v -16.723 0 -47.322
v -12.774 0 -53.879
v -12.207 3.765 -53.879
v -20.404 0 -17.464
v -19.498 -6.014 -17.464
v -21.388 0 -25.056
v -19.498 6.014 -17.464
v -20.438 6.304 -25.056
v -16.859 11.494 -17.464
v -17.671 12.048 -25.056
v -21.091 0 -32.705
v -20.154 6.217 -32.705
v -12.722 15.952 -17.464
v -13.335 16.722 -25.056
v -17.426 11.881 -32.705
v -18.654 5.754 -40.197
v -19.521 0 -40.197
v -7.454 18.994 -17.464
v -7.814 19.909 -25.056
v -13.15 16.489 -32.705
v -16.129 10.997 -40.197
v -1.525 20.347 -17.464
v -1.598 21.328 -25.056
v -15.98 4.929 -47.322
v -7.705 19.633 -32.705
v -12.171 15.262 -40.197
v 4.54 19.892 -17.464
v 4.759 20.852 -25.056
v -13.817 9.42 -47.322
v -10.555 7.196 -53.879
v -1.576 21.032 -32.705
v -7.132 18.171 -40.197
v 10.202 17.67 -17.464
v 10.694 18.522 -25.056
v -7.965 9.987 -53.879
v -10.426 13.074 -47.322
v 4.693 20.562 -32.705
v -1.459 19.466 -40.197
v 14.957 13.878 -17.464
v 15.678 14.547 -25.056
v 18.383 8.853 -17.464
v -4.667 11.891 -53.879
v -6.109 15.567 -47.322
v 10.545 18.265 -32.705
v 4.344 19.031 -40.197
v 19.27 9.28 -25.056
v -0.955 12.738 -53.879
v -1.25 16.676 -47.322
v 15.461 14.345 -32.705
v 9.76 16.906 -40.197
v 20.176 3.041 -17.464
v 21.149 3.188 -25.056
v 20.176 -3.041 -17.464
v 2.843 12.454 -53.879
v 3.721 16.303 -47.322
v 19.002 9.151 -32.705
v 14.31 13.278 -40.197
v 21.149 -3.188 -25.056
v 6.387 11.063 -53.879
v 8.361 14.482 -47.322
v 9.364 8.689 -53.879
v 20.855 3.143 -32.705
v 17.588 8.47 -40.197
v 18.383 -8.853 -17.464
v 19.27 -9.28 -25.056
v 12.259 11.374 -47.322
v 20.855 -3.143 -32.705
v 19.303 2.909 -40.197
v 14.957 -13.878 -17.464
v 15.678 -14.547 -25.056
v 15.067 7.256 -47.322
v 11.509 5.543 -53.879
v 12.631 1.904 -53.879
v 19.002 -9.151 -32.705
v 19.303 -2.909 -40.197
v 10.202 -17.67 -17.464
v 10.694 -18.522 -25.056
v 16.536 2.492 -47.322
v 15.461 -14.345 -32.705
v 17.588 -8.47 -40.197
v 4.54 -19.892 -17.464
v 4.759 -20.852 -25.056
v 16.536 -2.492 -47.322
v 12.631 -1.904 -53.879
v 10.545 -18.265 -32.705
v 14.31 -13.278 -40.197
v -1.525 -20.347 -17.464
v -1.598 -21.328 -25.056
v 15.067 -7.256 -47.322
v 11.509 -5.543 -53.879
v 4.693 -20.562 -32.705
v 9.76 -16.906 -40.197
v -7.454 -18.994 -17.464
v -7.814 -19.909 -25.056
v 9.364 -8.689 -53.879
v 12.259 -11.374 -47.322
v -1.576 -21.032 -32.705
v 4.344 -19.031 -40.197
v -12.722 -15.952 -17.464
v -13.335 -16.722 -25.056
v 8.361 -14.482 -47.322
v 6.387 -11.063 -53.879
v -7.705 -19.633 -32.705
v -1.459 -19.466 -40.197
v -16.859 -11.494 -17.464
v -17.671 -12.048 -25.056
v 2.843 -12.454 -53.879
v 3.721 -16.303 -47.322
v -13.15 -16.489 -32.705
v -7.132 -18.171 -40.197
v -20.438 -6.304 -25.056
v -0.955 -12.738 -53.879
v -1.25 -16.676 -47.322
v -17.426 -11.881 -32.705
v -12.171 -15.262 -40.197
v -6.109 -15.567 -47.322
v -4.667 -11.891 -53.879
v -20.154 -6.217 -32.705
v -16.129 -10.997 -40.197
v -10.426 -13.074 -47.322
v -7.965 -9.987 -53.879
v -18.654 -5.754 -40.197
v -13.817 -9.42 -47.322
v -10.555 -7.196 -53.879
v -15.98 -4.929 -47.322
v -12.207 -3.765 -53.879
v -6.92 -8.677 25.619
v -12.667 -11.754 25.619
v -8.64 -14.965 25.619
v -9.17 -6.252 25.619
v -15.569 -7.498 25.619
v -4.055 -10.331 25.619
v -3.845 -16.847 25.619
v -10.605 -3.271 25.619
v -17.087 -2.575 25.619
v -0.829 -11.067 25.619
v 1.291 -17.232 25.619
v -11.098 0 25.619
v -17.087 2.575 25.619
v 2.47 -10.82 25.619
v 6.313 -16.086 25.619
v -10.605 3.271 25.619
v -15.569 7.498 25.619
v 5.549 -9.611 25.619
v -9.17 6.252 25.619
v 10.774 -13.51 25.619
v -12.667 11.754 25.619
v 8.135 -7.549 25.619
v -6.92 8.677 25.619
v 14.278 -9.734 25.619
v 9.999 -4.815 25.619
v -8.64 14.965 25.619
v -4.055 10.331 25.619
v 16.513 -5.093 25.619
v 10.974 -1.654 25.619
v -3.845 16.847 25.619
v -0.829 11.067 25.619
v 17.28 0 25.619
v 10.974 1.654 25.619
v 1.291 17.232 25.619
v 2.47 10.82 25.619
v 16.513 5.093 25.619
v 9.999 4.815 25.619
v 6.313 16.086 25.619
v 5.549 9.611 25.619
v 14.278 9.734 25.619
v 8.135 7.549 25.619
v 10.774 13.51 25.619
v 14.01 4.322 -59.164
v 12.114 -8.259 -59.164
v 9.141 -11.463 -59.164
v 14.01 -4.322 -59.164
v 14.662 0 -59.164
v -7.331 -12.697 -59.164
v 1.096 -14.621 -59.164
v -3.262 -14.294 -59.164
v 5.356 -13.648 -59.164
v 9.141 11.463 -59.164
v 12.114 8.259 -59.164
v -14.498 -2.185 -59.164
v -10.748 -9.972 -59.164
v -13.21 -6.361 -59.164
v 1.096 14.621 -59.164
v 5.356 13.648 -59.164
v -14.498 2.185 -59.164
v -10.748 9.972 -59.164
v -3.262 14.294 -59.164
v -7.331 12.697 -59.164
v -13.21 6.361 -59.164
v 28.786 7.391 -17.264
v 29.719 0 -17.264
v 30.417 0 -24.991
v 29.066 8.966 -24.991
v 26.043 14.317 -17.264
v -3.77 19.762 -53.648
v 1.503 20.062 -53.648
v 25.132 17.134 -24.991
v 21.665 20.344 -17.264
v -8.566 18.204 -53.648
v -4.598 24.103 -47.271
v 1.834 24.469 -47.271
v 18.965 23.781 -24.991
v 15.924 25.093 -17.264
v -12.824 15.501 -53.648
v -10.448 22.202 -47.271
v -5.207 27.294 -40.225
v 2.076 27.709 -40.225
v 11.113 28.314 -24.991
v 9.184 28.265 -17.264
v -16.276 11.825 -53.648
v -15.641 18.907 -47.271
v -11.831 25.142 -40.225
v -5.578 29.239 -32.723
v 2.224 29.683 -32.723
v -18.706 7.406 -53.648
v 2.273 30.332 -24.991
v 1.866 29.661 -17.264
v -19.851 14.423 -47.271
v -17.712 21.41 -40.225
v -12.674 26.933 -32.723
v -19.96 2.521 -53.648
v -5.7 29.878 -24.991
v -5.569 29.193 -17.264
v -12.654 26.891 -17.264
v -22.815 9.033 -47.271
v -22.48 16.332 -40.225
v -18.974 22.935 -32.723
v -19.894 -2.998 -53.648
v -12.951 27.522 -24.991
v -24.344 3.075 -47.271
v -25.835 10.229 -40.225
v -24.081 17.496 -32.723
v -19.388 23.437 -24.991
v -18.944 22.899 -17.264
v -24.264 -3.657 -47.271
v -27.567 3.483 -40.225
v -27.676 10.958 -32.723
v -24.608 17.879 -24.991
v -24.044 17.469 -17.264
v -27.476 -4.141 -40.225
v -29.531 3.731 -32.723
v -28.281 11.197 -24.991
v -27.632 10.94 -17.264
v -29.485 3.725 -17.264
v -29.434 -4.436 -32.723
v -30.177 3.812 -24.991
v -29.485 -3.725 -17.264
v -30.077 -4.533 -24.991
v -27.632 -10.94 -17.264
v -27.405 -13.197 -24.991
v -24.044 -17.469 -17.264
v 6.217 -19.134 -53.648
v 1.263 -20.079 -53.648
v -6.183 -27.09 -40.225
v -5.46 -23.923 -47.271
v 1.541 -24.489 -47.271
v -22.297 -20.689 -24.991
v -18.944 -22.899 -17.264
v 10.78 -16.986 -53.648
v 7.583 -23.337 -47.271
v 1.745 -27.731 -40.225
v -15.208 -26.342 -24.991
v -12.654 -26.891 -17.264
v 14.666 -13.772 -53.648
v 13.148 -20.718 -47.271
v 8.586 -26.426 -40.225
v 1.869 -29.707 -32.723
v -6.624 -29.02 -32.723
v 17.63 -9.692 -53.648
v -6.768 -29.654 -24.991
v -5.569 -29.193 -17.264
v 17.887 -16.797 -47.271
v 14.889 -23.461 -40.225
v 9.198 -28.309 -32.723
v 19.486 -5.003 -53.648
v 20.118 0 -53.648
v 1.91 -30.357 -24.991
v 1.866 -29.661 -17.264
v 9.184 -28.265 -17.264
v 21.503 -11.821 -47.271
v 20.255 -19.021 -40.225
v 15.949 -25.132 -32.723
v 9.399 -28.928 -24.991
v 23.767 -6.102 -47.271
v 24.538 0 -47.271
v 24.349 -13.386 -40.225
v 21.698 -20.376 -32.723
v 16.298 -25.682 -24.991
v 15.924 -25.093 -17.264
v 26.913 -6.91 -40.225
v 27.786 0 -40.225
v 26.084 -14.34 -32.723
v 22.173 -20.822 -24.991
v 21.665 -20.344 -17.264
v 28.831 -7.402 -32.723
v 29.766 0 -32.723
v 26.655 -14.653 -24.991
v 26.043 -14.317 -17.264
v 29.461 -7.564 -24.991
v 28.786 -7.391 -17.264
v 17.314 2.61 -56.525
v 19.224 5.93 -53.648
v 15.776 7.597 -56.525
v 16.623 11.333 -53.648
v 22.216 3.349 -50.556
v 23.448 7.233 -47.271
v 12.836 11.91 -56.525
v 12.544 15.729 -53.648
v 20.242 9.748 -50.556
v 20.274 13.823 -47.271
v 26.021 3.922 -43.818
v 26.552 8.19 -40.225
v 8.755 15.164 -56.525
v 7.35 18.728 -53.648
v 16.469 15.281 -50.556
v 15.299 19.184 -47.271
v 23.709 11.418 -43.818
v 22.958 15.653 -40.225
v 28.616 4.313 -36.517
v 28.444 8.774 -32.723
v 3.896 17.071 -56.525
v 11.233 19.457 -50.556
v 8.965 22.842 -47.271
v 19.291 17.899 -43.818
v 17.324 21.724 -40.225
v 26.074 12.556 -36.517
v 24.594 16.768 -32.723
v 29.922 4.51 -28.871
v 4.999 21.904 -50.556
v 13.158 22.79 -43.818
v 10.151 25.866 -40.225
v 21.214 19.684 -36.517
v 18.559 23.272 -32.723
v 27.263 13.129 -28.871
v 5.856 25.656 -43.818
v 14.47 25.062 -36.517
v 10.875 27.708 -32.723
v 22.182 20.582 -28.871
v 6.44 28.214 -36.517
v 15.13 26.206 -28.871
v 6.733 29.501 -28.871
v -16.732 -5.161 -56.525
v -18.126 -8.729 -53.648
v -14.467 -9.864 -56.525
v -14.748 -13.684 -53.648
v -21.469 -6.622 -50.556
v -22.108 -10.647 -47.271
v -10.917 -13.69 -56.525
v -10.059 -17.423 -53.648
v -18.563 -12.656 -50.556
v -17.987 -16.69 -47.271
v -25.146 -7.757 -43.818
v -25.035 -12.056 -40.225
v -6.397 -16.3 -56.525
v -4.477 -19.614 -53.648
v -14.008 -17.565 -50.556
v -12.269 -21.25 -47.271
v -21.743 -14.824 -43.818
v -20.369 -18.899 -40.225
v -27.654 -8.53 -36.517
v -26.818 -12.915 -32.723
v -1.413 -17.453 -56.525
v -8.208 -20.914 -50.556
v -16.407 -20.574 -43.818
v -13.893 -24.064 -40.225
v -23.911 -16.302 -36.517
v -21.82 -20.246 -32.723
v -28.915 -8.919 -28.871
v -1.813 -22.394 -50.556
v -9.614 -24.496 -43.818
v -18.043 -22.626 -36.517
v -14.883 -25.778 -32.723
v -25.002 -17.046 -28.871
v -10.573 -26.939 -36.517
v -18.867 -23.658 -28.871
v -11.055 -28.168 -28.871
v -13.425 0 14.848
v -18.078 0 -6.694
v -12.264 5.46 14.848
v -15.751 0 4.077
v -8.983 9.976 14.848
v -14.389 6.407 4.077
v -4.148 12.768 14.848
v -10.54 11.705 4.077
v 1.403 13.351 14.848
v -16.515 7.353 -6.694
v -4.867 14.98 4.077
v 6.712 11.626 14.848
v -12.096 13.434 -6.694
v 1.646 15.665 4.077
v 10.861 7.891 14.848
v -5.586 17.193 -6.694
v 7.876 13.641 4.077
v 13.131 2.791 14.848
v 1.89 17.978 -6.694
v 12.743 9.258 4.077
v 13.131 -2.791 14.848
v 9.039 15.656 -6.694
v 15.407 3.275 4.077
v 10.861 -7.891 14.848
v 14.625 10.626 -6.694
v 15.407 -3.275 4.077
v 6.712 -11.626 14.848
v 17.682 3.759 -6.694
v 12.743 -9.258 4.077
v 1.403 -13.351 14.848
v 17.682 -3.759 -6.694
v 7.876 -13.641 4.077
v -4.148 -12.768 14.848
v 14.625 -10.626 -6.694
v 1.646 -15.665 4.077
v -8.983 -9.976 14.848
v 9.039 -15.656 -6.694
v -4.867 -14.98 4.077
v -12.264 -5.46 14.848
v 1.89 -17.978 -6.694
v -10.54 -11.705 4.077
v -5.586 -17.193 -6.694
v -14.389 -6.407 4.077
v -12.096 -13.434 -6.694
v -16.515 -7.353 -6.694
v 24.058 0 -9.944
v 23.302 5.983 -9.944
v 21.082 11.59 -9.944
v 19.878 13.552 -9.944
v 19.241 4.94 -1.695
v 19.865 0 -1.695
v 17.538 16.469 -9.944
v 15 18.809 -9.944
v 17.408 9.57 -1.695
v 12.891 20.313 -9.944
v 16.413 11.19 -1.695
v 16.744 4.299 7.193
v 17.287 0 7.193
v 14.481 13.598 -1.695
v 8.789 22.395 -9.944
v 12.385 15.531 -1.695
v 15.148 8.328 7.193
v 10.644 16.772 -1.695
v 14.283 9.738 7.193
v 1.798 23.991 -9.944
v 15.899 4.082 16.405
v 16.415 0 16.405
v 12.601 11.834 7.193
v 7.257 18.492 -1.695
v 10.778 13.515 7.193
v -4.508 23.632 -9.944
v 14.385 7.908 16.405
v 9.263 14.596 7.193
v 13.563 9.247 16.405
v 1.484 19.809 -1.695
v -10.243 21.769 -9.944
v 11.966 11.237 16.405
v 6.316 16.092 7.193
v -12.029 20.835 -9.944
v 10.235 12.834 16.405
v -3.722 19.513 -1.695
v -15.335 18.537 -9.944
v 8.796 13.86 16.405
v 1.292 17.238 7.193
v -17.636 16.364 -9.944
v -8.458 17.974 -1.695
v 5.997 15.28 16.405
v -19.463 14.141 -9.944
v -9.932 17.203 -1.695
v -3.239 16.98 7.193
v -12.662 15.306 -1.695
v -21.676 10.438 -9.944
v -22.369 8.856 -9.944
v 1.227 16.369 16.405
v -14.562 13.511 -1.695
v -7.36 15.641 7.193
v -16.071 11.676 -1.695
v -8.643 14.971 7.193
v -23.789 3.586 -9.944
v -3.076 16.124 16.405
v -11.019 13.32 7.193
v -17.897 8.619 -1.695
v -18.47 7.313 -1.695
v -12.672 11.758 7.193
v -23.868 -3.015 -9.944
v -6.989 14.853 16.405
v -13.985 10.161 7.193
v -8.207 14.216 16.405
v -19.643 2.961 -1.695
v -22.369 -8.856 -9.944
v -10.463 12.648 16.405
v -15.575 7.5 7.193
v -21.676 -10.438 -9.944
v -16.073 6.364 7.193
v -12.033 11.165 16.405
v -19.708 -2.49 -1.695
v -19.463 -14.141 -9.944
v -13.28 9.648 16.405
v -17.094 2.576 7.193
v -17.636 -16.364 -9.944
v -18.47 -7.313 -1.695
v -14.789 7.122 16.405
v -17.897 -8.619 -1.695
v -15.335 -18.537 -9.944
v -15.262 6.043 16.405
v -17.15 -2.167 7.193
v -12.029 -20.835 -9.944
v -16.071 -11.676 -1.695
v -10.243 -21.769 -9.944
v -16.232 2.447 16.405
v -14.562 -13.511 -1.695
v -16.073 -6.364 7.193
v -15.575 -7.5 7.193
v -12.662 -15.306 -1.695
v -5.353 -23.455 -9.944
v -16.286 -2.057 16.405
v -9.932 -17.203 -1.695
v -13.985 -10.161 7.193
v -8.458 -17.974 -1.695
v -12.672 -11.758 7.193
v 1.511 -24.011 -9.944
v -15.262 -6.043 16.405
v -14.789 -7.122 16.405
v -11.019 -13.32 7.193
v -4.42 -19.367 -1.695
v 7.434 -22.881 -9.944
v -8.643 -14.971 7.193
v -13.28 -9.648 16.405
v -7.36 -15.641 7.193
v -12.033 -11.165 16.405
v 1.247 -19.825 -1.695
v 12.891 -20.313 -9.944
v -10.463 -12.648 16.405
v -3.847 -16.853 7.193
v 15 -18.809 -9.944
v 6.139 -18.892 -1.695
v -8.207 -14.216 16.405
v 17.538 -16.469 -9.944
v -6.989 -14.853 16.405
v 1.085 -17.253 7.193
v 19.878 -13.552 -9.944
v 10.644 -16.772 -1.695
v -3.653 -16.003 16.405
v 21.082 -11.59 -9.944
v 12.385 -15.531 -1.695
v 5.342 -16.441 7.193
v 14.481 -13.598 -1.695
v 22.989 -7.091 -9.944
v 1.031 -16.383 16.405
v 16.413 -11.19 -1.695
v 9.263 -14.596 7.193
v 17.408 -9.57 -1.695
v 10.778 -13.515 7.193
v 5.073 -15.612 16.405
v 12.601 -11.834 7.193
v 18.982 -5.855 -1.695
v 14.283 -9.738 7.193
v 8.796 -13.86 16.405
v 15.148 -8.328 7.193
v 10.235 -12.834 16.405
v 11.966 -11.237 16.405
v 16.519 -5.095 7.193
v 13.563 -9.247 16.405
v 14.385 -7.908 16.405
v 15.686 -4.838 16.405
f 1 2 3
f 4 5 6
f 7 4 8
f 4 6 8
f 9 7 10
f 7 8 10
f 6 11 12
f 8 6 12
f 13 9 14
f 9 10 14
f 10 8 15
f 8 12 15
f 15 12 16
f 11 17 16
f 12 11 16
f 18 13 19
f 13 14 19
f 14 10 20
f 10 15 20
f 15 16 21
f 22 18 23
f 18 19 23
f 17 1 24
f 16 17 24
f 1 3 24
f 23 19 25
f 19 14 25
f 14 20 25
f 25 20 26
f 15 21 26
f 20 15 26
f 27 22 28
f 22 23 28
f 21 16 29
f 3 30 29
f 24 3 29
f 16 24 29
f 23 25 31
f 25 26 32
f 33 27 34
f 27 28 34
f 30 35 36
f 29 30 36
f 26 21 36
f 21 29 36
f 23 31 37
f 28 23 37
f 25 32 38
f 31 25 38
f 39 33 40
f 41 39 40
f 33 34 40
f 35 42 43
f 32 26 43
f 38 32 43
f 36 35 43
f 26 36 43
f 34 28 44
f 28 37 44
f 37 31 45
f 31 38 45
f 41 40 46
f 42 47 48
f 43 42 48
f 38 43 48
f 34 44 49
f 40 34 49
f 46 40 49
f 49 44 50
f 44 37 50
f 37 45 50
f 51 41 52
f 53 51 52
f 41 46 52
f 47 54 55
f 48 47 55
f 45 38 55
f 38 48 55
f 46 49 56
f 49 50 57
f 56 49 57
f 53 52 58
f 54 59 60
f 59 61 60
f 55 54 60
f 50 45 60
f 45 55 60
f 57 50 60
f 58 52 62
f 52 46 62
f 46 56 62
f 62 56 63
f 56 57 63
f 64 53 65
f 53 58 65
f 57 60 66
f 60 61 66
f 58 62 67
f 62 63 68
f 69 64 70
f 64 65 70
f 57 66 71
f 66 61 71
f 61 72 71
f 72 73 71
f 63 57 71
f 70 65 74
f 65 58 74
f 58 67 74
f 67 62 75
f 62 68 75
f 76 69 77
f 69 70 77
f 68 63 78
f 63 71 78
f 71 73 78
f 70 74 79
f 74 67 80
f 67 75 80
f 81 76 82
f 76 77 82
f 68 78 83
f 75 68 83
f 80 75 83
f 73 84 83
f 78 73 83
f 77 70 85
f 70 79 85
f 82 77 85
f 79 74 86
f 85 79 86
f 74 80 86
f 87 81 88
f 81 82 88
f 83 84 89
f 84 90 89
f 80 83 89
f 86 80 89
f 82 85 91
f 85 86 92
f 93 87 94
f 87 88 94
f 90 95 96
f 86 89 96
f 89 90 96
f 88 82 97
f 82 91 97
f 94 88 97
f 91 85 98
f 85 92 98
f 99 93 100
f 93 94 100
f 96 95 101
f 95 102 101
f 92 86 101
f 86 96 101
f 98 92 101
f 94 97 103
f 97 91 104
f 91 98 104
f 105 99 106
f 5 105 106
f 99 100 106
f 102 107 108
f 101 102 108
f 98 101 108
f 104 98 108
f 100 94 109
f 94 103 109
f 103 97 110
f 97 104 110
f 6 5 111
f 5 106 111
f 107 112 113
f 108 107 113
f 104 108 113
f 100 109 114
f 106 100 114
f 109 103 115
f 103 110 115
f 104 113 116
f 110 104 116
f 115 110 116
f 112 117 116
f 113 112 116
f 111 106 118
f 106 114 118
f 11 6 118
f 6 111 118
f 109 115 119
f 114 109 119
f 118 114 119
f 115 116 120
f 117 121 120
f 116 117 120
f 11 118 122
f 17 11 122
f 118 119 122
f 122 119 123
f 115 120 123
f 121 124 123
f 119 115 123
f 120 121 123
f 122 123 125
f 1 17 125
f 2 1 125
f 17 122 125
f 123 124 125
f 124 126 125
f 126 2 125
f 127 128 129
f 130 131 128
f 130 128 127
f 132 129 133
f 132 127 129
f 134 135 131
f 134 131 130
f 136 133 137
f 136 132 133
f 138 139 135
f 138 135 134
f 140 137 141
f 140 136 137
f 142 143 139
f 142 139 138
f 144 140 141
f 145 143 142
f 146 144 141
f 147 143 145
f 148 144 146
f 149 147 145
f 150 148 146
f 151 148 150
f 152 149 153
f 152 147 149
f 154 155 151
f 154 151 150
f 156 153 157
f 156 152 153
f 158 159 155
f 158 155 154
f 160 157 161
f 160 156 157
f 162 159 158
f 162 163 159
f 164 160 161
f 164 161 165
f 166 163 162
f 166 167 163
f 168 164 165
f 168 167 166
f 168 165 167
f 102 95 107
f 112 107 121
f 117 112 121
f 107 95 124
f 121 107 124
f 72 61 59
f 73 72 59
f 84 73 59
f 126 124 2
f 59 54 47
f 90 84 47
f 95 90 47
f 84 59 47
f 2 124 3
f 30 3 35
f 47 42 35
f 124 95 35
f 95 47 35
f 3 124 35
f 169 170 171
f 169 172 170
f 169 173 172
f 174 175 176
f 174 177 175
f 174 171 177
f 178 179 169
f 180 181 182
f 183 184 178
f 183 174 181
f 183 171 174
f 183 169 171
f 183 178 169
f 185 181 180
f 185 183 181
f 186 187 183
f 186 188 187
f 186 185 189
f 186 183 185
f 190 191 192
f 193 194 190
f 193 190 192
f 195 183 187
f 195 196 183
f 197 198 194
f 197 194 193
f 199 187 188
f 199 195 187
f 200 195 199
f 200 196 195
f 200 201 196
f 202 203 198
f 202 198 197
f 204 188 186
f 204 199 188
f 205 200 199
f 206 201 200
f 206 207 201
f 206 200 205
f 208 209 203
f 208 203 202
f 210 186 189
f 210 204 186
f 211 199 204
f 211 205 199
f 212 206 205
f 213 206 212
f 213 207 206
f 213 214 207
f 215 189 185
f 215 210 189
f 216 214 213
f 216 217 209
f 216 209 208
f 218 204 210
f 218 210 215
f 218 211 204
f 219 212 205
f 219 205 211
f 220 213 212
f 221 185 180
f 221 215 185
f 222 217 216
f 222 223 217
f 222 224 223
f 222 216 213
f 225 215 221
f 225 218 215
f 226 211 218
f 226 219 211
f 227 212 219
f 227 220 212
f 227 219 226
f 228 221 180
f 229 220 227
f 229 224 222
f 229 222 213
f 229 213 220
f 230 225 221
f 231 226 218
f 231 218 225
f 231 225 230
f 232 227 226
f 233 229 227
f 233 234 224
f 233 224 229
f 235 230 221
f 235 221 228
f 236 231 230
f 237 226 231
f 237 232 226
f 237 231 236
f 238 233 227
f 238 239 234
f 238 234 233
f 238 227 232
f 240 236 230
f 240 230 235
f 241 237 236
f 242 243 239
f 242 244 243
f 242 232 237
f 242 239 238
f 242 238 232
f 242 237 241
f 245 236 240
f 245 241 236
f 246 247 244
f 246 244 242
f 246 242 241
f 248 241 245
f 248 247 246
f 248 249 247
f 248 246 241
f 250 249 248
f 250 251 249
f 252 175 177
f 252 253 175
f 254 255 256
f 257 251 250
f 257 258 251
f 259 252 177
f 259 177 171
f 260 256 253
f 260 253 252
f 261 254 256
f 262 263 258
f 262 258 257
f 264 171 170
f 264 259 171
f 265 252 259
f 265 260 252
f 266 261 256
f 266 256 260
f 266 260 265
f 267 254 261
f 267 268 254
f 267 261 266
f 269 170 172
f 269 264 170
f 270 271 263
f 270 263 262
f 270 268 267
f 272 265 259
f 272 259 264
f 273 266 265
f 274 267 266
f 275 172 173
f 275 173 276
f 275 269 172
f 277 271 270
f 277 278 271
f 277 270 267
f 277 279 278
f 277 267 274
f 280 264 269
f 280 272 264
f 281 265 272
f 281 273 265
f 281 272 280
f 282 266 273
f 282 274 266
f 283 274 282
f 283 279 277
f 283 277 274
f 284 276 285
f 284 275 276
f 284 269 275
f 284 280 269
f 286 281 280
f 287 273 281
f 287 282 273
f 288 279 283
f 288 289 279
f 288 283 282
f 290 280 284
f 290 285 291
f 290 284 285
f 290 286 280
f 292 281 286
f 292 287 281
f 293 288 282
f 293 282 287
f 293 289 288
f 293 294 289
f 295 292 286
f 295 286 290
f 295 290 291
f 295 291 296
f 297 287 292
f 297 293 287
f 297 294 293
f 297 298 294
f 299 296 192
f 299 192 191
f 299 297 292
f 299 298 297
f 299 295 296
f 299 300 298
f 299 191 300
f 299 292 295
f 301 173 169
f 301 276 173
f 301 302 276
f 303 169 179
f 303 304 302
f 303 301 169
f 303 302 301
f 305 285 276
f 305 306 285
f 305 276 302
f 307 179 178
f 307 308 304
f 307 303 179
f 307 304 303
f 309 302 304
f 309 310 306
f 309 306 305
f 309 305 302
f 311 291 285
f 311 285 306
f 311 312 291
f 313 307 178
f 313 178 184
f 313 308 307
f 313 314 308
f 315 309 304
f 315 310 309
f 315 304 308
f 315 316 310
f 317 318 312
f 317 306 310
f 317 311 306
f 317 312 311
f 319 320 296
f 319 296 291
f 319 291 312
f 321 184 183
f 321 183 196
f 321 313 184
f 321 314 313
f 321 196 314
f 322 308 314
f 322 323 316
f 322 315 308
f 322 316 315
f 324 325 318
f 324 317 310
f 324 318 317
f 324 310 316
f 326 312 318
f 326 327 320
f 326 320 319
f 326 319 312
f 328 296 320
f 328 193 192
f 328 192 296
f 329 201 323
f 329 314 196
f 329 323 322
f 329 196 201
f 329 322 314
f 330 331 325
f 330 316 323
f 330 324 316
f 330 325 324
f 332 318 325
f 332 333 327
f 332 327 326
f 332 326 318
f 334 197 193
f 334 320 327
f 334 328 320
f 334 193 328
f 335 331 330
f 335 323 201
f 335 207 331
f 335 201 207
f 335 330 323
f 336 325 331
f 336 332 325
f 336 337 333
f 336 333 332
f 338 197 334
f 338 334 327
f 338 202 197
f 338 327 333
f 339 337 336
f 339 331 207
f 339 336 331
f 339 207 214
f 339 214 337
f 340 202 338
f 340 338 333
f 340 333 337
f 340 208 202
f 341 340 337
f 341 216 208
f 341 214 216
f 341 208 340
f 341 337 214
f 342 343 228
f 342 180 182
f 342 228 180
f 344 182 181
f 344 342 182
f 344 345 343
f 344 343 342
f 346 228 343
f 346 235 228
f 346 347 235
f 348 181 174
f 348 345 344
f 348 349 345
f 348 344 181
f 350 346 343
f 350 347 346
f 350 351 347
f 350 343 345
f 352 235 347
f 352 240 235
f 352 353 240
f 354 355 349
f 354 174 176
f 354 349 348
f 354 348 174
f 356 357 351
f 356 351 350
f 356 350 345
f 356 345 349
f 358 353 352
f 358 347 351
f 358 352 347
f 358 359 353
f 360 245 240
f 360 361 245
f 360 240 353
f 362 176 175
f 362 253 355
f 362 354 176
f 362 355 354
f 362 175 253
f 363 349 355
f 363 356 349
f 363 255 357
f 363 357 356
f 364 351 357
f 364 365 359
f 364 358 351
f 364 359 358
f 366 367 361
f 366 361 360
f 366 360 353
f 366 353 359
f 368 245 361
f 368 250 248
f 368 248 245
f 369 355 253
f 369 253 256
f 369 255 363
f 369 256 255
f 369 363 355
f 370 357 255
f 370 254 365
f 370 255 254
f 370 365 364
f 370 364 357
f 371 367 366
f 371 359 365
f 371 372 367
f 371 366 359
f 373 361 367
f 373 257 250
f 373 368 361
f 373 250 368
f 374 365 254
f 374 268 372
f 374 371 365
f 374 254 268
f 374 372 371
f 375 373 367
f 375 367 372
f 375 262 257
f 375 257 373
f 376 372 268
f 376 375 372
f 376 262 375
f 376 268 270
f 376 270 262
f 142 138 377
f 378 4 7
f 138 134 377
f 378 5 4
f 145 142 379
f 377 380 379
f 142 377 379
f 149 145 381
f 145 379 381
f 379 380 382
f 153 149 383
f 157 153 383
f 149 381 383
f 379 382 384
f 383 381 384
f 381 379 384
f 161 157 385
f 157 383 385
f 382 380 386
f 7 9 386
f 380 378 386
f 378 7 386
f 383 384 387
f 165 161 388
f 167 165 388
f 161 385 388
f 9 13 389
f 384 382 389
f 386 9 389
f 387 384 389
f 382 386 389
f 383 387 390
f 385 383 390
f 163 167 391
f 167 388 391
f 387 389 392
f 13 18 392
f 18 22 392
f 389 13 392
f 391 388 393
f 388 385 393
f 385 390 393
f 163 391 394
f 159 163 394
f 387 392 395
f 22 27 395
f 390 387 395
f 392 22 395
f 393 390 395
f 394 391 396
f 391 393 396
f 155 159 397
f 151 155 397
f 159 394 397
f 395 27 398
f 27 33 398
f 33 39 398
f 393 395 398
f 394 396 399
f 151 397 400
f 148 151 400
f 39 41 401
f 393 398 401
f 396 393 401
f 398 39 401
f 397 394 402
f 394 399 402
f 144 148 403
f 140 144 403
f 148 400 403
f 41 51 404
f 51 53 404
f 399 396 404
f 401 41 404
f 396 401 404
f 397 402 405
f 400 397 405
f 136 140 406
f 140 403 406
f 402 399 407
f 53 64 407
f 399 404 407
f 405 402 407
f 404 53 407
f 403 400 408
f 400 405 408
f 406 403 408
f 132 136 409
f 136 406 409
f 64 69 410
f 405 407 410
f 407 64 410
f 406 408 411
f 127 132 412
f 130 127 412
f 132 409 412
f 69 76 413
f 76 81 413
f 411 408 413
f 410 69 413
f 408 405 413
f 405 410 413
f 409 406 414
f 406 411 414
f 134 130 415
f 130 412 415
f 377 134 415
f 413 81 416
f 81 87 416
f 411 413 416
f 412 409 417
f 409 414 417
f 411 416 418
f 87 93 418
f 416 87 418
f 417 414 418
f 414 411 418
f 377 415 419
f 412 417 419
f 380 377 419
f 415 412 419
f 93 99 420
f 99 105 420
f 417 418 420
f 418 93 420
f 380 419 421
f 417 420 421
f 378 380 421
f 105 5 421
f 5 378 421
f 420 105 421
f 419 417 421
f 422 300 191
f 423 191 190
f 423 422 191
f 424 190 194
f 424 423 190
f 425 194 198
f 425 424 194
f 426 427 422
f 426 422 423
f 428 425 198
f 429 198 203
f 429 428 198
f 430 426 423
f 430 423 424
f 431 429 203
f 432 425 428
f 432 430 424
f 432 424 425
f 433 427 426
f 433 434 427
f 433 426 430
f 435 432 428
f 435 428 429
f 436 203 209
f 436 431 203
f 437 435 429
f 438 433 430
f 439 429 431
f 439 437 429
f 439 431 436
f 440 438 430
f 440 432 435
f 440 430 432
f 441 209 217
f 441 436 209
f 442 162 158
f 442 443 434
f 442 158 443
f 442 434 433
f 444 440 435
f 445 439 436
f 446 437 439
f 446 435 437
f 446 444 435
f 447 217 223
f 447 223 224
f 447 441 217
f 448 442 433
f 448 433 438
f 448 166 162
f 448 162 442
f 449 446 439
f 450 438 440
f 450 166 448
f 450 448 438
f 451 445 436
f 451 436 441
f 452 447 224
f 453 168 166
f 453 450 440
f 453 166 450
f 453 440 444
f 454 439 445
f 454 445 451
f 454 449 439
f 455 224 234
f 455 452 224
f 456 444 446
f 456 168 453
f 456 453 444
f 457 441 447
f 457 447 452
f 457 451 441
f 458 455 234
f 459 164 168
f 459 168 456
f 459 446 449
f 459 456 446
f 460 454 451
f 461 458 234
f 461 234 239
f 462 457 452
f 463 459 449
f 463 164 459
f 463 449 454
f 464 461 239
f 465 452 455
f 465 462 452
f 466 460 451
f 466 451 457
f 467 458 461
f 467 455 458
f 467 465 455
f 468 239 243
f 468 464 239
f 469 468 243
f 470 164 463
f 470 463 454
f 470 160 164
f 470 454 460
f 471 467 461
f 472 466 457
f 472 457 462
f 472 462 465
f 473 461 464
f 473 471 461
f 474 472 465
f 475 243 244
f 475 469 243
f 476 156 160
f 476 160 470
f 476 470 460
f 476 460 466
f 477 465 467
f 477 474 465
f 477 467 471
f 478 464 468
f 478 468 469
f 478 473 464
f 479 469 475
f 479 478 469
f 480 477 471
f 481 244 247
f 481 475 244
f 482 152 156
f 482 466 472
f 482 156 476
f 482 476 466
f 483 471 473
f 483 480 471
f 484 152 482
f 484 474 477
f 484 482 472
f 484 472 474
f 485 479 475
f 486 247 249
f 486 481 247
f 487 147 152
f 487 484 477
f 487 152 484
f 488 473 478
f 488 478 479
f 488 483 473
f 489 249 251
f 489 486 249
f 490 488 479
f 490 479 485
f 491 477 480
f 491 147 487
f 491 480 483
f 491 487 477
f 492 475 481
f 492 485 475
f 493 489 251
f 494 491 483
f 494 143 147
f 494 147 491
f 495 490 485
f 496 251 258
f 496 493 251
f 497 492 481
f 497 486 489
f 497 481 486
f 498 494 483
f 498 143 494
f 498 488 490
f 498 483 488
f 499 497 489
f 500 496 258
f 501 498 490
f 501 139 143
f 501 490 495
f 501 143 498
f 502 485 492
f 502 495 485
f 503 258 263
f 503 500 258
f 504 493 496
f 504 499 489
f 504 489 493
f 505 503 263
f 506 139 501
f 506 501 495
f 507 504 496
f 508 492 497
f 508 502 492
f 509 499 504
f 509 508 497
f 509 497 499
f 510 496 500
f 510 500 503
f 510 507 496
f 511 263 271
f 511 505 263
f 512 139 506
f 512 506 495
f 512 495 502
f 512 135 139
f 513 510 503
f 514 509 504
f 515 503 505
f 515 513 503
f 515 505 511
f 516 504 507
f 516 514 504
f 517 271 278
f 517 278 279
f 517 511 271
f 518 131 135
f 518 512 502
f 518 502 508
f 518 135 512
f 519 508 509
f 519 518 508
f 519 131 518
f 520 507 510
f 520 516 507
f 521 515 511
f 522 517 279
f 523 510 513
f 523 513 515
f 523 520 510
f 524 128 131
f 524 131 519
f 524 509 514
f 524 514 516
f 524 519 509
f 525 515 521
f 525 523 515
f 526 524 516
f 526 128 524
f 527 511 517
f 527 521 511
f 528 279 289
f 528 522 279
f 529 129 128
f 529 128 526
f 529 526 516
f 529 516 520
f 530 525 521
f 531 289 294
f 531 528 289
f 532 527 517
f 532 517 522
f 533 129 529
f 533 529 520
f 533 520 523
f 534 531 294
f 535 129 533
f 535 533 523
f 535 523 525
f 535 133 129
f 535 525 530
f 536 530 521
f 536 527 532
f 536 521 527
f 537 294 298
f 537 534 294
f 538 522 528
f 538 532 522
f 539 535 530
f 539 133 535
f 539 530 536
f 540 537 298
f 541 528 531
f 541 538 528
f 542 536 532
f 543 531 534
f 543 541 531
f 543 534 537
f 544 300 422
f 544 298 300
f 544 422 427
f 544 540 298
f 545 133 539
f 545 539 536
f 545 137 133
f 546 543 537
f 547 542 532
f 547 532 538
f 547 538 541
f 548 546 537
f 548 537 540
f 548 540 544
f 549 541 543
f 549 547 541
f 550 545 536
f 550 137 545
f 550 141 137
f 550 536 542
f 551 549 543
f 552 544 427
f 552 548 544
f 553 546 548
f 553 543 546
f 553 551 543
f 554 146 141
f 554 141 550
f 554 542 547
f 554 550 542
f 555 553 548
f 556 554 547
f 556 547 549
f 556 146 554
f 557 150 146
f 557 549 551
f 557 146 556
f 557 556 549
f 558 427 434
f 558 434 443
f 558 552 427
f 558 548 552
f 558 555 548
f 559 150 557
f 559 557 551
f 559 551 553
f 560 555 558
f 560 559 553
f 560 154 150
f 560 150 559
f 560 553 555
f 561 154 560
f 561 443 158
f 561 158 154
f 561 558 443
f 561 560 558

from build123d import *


with BuildPart() as f1:
    # F0 (on Front) → F1 (revolve)
    with BuildSketch(Plane.XZ):
        with BuildLine():
            Line((0, -59.163861), (14.661524, -59.163861))
            ThreePointArc((14.661524, -59.163861), (27.786311, -40.224746), (29.719422, -17.263623))
            ThreePointArc((29.719422, -17.263623), (18.366684, 2.688503), (17.28029, 25.618652))
            Line((17.28029, 25.618652), (0, 25.618652))
            Line((0, 25.618652), (0, -59.163861))
        make_face()
    revolve(axis=Axis((0, 0, -16.772605), (0, 0, 1)))

    # F2 (on Front) → F3 (revolve, cut)
    with BuildSketch(Plane.XZ):
        with BuildLine():
            Line((0, 25.88696), (-11.040121, 25.88696))
            Line((-11.040121, 25.88696), (-20.404007, -17.464366))
            ThreePointArc((-20.404007, -17.464366), (-20.462926, -36.483582), (-12.774174, -53.879477))
            Line((-12.774174, -53.879477), (0, -53.879477))
            Line((0, -53.879477), (0, 25.88696))
        make_face()
    revolve(axis=Axis((0, 0, -13.996258), (0, 0, -1)), mode=Mode.SUBTRACT)


solid = f1.part
